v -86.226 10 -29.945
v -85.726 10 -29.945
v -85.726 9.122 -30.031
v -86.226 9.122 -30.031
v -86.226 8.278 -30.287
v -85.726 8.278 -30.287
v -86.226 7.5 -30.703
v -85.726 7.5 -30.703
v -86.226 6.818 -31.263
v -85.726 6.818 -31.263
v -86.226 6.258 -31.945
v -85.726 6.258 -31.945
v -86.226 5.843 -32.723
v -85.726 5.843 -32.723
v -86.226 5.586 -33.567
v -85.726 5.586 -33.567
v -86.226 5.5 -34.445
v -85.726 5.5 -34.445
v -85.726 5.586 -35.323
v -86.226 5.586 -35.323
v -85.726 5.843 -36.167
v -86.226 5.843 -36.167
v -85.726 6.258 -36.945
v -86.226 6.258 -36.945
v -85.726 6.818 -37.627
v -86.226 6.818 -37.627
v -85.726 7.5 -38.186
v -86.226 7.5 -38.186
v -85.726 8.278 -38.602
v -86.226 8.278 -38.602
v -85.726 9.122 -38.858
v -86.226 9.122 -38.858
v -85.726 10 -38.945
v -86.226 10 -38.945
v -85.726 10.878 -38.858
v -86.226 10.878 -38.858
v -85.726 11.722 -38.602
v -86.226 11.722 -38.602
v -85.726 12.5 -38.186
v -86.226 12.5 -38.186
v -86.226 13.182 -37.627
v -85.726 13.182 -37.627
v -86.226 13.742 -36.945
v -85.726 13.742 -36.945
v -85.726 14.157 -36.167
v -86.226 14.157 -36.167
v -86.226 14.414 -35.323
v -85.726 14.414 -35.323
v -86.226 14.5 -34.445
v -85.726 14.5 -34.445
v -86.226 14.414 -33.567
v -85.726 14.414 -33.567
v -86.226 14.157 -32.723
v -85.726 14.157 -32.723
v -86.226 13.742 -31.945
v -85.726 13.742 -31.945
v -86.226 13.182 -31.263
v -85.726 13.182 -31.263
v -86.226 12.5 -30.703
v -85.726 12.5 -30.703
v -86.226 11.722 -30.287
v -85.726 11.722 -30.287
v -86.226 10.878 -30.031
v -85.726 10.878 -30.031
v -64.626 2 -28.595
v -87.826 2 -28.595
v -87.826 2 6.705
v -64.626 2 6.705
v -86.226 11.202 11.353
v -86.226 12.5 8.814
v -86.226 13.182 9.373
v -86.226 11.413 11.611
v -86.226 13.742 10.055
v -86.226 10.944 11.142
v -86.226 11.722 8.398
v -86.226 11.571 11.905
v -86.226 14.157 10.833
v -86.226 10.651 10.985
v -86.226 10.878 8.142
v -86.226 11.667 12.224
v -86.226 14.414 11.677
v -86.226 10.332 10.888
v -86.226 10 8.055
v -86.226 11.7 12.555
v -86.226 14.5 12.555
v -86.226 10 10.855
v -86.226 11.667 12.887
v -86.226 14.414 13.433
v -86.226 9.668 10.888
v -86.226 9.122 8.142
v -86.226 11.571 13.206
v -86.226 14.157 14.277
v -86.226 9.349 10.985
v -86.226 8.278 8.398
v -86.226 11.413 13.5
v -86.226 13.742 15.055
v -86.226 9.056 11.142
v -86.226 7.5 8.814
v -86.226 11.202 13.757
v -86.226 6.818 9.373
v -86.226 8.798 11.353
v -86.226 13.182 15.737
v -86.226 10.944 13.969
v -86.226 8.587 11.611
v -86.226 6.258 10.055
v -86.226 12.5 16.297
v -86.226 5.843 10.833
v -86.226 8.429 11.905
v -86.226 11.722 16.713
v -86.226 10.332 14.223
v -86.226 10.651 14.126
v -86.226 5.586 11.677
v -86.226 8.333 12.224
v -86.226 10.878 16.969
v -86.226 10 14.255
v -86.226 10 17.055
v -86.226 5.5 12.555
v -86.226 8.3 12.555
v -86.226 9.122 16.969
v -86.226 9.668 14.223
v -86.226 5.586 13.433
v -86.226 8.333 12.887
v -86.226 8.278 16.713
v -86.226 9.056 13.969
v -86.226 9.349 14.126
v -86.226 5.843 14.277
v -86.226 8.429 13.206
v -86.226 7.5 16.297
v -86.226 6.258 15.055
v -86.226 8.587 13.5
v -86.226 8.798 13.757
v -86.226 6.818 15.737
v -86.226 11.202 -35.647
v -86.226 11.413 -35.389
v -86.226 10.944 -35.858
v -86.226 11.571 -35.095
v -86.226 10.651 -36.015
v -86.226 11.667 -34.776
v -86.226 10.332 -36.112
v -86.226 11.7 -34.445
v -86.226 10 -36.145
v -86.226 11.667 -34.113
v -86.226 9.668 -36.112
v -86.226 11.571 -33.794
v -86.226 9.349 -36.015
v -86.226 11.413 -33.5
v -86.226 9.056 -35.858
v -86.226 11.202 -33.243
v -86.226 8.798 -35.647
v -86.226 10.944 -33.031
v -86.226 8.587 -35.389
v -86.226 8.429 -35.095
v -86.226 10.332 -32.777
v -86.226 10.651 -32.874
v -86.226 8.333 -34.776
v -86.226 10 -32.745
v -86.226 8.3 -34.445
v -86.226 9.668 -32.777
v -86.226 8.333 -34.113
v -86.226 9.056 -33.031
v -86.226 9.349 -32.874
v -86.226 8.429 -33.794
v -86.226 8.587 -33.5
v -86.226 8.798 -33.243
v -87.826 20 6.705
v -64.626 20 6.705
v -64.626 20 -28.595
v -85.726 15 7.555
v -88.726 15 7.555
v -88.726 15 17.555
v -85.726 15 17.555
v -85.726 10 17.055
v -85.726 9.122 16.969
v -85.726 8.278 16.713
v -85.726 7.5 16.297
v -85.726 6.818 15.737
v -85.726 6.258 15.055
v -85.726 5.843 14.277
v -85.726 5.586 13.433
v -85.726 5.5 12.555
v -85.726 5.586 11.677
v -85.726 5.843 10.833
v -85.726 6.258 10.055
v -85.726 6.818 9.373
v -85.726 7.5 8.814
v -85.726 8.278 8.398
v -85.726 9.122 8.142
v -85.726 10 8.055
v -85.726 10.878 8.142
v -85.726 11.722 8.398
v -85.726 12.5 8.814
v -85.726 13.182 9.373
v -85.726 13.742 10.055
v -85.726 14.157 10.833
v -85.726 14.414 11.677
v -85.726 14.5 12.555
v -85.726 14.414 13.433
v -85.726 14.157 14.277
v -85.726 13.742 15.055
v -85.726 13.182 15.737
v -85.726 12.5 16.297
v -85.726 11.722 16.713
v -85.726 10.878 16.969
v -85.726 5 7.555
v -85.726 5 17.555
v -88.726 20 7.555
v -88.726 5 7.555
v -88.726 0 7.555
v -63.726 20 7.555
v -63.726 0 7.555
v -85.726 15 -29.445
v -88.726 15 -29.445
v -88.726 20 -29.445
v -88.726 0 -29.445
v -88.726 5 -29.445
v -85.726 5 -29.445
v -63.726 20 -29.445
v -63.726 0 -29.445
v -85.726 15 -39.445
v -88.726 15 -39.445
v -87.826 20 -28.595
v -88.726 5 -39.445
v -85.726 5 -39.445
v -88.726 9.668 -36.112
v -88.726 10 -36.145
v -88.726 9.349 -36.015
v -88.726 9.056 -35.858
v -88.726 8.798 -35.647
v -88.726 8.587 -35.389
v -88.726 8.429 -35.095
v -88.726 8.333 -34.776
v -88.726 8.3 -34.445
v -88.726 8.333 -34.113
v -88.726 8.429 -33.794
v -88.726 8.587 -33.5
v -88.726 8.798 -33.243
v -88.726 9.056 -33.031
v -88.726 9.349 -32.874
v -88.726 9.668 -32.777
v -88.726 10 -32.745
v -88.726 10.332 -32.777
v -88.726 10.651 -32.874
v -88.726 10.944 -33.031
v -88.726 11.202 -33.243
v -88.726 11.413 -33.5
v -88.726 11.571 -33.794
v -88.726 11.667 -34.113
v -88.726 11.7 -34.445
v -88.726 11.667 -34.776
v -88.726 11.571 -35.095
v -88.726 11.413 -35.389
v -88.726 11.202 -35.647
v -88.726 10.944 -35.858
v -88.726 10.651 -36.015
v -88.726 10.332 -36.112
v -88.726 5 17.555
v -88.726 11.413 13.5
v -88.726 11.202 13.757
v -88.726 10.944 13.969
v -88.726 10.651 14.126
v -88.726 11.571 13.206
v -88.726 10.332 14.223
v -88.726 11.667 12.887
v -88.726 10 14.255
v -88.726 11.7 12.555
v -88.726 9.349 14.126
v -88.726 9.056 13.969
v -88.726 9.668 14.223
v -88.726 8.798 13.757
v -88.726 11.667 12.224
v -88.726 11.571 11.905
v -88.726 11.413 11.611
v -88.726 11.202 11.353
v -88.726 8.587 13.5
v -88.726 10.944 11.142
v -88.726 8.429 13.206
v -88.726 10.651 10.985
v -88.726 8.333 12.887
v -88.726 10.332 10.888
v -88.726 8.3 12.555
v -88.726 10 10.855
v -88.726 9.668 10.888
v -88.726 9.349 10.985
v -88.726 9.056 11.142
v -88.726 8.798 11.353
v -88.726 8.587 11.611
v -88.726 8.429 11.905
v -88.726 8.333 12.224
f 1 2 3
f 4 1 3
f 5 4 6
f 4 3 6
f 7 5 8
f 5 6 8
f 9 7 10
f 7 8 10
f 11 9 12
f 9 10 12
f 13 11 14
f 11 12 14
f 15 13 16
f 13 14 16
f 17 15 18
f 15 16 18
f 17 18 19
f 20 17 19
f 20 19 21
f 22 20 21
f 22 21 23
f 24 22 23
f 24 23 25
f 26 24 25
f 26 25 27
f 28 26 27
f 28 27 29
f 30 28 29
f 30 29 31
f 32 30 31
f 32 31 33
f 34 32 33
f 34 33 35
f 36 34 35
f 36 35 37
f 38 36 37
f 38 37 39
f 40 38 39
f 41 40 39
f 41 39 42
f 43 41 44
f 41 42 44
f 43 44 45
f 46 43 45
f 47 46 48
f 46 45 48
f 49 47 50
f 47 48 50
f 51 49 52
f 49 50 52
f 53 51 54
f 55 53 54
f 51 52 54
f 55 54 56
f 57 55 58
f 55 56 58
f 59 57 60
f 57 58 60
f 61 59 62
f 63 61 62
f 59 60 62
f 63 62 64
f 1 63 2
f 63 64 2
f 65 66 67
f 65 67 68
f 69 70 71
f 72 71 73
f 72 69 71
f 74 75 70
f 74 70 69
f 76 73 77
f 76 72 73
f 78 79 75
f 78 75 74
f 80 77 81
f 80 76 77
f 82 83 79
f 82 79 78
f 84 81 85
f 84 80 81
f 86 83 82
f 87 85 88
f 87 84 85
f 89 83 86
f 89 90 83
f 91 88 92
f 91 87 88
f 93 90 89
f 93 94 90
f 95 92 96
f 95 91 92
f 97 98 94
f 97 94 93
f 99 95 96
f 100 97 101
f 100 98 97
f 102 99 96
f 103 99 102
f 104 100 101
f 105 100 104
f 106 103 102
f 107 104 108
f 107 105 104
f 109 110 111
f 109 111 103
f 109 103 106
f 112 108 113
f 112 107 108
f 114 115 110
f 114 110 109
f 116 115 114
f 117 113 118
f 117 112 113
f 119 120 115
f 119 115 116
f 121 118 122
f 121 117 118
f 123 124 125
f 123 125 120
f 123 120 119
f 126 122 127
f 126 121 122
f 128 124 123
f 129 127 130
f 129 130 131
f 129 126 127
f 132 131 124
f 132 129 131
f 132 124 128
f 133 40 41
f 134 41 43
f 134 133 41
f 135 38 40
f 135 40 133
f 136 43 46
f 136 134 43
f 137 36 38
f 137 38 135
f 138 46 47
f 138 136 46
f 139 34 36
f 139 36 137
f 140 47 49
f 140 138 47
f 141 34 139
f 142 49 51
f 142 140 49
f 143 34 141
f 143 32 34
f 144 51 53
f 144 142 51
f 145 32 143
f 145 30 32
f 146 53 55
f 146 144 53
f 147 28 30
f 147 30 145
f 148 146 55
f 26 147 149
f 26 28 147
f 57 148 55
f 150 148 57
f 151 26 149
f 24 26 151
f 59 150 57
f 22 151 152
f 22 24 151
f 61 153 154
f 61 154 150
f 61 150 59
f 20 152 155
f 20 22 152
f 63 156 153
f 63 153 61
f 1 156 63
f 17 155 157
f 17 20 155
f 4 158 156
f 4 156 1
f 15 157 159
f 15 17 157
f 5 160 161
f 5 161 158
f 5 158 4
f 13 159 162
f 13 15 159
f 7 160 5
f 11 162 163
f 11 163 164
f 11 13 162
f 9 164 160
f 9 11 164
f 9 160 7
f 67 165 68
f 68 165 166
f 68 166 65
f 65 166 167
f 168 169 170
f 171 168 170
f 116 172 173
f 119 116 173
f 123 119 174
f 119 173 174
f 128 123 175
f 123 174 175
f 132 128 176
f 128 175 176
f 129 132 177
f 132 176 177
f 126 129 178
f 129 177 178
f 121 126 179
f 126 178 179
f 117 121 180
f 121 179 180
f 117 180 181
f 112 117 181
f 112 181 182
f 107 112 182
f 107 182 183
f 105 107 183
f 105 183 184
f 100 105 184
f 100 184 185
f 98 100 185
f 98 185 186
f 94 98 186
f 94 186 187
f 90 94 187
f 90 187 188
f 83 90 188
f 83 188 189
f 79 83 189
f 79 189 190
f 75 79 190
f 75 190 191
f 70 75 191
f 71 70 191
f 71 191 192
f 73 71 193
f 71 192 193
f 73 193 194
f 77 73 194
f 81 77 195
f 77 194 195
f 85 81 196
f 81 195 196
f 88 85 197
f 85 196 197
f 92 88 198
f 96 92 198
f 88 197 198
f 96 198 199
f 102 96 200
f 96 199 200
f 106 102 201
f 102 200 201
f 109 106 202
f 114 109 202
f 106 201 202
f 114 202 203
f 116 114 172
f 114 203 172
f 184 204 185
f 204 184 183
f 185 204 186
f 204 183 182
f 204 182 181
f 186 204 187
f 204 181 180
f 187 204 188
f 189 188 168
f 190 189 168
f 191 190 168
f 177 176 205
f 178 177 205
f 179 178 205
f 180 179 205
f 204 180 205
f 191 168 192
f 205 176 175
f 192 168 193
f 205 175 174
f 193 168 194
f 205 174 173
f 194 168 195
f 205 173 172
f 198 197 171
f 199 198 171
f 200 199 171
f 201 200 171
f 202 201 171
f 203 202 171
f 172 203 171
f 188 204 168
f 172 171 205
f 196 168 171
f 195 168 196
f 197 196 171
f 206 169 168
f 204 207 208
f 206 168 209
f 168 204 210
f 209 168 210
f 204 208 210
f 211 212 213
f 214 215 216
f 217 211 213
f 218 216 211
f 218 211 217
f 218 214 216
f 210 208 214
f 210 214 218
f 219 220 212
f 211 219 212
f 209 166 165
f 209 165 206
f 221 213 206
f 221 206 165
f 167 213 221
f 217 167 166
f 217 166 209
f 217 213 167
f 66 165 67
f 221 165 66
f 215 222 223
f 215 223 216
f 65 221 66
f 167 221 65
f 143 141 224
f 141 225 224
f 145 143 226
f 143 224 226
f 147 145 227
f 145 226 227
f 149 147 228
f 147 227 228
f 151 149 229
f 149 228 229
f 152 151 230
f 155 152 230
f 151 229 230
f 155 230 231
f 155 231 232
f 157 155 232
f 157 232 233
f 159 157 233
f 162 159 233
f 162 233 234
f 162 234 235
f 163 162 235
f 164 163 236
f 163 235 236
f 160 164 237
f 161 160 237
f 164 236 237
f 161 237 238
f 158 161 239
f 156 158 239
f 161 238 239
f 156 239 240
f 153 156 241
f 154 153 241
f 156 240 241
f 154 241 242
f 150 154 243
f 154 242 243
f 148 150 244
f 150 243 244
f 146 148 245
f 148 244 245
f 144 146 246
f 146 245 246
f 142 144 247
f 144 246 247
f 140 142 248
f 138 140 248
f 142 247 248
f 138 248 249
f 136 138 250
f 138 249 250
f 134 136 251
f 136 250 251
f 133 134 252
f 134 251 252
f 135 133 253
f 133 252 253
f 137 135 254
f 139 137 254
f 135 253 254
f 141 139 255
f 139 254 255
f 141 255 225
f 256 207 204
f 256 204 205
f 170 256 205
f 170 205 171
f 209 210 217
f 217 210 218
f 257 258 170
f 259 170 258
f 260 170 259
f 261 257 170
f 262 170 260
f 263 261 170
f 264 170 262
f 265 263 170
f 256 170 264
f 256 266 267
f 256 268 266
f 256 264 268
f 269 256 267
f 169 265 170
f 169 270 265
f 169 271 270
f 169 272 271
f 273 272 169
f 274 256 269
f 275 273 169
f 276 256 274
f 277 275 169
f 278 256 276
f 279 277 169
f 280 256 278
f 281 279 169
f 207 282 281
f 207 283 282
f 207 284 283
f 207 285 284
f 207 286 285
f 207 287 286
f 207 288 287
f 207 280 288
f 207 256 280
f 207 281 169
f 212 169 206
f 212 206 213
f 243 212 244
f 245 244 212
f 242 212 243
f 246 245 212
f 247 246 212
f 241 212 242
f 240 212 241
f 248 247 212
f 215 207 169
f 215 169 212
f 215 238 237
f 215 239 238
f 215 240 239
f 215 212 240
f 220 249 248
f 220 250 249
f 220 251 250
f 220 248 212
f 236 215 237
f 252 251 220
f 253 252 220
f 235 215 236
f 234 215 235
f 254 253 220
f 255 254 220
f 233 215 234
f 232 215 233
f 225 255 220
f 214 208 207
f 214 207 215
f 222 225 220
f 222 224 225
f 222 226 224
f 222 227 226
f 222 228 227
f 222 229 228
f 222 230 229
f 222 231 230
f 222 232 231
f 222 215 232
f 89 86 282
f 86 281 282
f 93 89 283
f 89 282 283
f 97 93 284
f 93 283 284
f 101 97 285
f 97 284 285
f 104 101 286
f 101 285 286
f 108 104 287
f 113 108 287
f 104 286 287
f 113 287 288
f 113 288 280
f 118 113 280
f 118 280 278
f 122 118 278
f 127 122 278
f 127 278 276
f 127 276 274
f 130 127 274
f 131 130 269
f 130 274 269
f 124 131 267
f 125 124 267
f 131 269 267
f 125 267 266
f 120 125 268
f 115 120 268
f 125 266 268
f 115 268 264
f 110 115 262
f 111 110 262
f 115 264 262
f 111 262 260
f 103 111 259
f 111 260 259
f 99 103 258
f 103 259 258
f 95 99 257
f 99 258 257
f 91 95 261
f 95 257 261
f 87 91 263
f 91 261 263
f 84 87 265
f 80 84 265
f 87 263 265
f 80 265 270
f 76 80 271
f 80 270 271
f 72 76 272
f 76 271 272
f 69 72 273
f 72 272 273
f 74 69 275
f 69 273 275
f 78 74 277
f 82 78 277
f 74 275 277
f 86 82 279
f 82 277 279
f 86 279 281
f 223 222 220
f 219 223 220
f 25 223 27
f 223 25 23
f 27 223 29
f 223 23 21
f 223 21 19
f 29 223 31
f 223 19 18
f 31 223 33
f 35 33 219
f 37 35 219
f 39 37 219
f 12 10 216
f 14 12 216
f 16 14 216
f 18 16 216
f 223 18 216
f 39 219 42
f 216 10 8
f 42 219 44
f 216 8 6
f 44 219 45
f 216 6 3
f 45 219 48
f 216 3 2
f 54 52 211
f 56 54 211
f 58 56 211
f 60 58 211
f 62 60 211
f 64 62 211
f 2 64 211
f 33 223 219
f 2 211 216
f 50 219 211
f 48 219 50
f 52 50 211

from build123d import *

# Parameters (mm, degrees)
SKETCH1_W                                            = 25
SKETCH1_H                                            = 37
BOSS_EXTRUDE2_DEPTH                                  = 20
SKETCH4_W                                            = 23.2
SKETCH4_H                                            = 35.3
CUT_EXTRUDE1_DEPTH                                   = 18
SKETCH30_W                                           = 10
SKETCH30_H                                           = 10
BOSS_EXTRUDE5_DEPTH                                  = 3
CBORE_FOR_M3_HEXAGON_HEAD_BOLTS_FULL_THR_D           = 3.4
CBORE_FOR_M3_HEXAGON_HEAD_BOLTS_FULL_THR_CBORE_D     = 9
CBORE_FOR_M3_HEXAGON_HEAD_BOLTS_FULL_THR_CBORE_DEPTH = 0.5


with BuildPart() as part:
    # Sketch1 → Boss-Extrude2 (new body)
    with BuildSketch(Plane(origin=(0, 0, 0), x_dir=(1, 0, 0), z_dir=(0, 1, 0))):
        with Locations((-76.226170177, 10.94482429)):
            Rectangle(SKETCH1_W, SKETCH1_H)
    extrude(amount=BOSS_EXTRUDE2_DEPTH)

    # Sketch4 → Cut-Extrude1 (cut)
    with BuildSketch(Plane(origin=(0, 20, 0), x_dir=(1, 0, 0), z_dir=(0, 1, 0))):
        with Locations((-76.226170177, 10.94482429)):
            Rectangle(SKETCH4_W, SKETCH4_H)
    extrude(amount=-CUT_EXTRUDE1_DEPTH, mode=Mode.SUBTRACT)

    # Sketch30 → Boss-Extrude5 (add)
    with BuildSketch(Plane.ZY.offset(88.726170177)):
        with Locations((-34.44482429, 10)):
            Rectangle(SKETCH30_W, SKETCH30_H)
        with Locations((12.55517571, 10)):
            Rectangle(SKETCH30_W, SKETCH30_H)
    extrude(amount=-BOSS_EXTRUDE5_DEPTH)

    # CBORE for M3 Hexagon head bolts-Full thread-grades AB5 (through all)
    with Locations(Plane(origin=(-85.726170177, 10, -34.44482429), x_dir=(0, 0, 1), z_dir=(1, 0, 0))):
        with Locations((0, 0), (47, 0)):
            CounterBoreHole(CBORE_FOR_M3_HEXAGON_HEAD_BOLTS_FULL_THR_D / 2, CBORE_FOR_M3_HEXAGON_HEAD_BOLTS_FULL_THR_CBORE_D / 2, CBORE_FOR_M3_HEXAGON_HEAD_BOLTS_FULL_THR_CBORE_DEPTH)


solid = part.part
